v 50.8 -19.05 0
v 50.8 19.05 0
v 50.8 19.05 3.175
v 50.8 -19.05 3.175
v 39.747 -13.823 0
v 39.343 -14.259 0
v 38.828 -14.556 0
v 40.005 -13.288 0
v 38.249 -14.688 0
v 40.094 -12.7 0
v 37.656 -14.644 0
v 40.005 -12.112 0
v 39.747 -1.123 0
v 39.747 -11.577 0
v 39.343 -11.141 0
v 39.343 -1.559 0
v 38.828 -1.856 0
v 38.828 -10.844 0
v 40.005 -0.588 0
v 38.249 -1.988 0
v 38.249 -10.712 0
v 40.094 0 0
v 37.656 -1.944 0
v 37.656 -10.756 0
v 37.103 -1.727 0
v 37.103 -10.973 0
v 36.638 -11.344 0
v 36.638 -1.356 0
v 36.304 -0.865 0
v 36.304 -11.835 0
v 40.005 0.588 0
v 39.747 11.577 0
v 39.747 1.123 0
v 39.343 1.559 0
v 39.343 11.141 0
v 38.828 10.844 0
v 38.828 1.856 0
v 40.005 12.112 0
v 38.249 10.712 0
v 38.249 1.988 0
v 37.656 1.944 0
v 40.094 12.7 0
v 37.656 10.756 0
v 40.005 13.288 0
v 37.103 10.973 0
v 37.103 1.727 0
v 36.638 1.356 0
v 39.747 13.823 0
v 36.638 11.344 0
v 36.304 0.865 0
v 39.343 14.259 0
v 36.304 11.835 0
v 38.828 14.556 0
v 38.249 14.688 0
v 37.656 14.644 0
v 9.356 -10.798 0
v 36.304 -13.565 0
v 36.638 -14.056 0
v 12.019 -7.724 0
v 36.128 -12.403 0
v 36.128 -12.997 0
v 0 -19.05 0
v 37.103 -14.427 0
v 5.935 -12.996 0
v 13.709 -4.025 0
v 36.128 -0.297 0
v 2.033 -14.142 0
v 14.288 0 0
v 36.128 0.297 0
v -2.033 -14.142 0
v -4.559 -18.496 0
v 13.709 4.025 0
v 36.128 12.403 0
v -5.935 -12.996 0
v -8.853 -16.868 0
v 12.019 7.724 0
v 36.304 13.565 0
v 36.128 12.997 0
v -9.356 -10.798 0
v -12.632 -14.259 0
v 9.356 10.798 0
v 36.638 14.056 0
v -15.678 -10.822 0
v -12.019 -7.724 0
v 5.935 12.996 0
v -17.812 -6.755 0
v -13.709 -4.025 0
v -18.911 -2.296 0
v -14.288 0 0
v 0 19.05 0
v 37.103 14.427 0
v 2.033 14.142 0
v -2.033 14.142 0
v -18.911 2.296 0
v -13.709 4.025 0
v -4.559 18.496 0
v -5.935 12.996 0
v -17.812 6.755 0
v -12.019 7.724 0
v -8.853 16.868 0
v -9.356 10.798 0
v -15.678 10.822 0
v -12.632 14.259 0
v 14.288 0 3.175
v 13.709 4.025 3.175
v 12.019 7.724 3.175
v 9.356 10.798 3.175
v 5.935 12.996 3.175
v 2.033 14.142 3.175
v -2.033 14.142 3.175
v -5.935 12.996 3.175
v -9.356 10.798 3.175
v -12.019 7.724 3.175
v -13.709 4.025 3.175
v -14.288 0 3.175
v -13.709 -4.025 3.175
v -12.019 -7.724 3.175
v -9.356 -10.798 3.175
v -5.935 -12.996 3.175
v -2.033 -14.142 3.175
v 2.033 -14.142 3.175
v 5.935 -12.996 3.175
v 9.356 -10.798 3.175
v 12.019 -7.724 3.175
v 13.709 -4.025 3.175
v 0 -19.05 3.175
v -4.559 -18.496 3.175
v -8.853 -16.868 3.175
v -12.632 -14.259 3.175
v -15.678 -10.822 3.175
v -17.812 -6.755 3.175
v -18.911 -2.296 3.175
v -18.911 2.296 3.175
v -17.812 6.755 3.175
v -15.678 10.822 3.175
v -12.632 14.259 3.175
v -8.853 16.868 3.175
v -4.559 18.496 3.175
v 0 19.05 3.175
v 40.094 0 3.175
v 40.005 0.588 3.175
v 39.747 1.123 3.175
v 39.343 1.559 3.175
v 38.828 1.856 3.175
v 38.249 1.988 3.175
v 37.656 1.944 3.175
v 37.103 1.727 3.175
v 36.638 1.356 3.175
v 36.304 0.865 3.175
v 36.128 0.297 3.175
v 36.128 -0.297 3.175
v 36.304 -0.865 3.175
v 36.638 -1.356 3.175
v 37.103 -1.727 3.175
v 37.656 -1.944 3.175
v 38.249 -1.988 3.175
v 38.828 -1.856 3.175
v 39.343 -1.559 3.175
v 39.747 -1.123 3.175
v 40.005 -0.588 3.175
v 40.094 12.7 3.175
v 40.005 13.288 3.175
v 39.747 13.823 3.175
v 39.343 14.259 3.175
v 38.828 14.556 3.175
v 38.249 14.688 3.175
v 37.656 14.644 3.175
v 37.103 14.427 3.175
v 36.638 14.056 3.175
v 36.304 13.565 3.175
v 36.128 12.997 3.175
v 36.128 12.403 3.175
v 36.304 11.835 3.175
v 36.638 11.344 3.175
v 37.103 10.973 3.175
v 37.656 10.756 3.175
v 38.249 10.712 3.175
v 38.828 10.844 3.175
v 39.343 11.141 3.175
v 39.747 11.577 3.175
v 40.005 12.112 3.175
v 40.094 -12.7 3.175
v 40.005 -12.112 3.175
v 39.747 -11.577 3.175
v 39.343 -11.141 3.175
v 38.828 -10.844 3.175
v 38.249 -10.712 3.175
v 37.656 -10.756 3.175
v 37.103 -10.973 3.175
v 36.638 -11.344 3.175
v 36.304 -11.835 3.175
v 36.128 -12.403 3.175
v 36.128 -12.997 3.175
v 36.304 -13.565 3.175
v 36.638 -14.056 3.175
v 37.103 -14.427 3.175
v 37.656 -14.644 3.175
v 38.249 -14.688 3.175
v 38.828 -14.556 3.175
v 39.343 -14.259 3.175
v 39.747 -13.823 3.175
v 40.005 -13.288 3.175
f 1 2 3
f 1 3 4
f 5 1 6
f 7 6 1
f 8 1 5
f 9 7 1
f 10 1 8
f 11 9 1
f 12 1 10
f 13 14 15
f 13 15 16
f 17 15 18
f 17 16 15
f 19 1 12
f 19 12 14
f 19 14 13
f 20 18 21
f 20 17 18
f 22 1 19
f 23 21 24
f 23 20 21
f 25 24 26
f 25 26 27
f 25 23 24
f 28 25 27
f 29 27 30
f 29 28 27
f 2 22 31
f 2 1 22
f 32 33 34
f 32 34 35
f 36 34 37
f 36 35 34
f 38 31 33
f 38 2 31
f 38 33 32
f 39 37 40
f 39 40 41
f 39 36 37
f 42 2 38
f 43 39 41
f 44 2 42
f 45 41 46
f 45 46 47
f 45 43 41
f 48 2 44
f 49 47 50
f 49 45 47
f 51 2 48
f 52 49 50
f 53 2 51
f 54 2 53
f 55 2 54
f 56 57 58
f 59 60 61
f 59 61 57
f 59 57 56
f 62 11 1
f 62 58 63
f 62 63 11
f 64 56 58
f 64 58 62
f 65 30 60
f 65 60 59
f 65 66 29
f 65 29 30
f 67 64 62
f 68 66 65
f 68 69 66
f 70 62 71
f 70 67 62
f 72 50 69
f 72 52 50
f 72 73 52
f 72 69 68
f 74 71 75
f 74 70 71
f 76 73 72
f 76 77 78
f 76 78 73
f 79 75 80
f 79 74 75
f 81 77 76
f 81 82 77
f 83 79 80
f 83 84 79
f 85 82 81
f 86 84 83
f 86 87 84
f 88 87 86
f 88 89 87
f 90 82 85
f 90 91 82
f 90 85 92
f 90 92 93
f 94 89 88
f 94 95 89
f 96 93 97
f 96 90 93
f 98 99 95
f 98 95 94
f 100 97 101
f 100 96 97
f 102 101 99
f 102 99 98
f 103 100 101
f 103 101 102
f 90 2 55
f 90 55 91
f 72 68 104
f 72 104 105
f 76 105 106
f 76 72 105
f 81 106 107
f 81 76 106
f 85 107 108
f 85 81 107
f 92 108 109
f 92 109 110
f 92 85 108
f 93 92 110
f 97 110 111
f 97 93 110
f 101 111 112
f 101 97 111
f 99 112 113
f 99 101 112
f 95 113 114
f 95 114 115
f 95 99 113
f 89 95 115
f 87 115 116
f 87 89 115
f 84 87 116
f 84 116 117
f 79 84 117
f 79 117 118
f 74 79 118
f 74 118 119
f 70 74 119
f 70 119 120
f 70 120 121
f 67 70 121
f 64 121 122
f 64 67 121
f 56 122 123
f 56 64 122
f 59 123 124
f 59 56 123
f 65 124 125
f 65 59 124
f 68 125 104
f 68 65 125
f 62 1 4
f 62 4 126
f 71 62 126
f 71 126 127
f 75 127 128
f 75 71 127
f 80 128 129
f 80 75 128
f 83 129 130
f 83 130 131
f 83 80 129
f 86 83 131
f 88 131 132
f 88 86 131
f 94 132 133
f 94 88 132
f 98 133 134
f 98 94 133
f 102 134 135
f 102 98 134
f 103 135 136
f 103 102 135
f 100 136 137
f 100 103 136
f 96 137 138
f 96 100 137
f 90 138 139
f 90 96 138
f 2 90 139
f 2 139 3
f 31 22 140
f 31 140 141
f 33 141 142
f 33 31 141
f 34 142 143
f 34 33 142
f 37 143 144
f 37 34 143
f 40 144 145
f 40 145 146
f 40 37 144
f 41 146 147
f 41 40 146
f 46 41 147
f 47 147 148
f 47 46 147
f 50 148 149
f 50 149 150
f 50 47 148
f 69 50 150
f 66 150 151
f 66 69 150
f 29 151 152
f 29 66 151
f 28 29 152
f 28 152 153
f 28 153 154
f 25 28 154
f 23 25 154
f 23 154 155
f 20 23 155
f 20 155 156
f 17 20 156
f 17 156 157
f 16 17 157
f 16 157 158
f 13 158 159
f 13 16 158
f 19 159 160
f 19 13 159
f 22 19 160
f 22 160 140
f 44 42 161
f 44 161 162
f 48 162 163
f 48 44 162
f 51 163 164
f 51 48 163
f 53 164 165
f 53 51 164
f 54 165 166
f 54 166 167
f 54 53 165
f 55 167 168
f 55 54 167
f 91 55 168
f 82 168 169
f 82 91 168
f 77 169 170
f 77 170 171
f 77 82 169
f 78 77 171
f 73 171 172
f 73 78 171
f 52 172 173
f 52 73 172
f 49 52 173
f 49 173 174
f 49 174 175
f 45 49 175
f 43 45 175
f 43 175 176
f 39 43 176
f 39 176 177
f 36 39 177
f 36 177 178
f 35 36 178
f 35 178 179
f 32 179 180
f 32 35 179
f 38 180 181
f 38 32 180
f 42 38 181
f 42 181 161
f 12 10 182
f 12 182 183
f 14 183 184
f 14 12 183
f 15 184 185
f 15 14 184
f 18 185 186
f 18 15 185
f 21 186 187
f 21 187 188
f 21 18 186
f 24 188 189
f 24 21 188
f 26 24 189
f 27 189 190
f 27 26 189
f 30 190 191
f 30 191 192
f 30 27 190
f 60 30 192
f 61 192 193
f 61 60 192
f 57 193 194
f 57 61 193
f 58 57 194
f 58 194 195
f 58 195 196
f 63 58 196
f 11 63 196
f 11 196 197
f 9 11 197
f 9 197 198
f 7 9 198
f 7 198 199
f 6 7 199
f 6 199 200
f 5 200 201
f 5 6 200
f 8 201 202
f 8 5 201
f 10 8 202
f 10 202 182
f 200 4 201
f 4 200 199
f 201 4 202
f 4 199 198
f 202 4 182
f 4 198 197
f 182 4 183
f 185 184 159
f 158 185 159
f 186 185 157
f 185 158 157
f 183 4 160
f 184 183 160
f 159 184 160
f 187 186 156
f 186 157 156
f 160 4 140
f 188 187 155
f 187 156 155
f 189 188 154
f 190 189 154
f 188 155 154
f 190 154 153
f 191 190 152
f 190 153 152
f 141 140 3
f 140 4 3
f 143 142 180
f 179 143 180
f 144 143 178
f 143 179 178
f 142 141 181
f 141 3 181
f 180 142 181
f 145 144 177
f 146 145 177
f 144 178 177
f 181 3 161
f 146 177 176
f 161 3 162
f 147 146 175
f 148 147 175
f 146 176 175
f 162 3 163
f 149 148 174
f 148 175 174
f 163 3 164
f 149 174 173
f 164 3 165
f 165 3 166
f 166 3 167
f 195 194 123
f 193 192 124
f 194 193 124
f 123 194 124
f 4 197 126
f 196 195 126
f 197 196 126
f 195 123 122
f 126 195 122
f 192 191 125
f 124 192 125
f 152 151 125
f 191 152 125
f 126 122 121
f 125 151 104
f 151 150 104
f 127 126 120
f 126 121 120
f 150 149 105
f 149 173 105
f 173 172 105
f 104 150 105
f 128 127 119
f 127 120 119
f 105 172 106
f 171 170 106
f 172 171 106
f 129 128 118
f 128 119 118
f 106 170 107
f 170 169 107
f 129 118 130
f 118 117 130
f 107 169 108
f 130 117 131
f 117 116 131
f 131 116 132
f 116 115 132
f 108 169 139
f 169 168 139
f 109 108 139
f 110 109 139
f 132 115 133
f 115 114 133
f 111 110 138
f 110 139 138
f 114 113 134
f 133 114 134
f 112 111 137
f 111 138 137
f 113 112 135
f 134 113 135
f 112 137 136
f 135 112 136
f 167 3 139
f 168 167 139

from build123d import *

# Parameters (mm, degrees)
SKETCH1_R           = 14.2875
SKETCH1_R_2         = 1.9939
BOSS_EXTRUDE1_DEPTH = 3.175


with BuildPart() as part:
    # Sketch1 → Boss-Extrude1 (new body)
    with BuildSketch(Plane.XY):
        with BuildLine():
            Line((0, 19.05), (25.4, 19.05))
            Line((25.4, 19.05), (50.8, 19.05))
            Line((50.8, 19.05), (50.8, -19.05))
            Line((50.8, -19.05), (25.4, -19.05))
            Line((25.4, -19.05), (0, -19.05))
            ThreePointArc((0, -19.05), (-19.05, 0), (0, 19.05))
        make_face()
        Circle(SKETCH1_R, mode=Mode.SUBTRACT)
        with Locations((38.1, -12.7)):
            Circle(SKETCH1_R_2, mode=Mode.SUBTRACT)
        with Locations((38.1, 0)):
            Circle(SKETCH1_R_2, mode=Mode.SUBTRACT)
        with Locations((38.1, 12.7)):
            Circle(SKETCH1_R_2, mode=Mode.SUBTRACT)
    extrude(amount=BOSS_EXTRUDE1_DEPTH)


solid = part.part
